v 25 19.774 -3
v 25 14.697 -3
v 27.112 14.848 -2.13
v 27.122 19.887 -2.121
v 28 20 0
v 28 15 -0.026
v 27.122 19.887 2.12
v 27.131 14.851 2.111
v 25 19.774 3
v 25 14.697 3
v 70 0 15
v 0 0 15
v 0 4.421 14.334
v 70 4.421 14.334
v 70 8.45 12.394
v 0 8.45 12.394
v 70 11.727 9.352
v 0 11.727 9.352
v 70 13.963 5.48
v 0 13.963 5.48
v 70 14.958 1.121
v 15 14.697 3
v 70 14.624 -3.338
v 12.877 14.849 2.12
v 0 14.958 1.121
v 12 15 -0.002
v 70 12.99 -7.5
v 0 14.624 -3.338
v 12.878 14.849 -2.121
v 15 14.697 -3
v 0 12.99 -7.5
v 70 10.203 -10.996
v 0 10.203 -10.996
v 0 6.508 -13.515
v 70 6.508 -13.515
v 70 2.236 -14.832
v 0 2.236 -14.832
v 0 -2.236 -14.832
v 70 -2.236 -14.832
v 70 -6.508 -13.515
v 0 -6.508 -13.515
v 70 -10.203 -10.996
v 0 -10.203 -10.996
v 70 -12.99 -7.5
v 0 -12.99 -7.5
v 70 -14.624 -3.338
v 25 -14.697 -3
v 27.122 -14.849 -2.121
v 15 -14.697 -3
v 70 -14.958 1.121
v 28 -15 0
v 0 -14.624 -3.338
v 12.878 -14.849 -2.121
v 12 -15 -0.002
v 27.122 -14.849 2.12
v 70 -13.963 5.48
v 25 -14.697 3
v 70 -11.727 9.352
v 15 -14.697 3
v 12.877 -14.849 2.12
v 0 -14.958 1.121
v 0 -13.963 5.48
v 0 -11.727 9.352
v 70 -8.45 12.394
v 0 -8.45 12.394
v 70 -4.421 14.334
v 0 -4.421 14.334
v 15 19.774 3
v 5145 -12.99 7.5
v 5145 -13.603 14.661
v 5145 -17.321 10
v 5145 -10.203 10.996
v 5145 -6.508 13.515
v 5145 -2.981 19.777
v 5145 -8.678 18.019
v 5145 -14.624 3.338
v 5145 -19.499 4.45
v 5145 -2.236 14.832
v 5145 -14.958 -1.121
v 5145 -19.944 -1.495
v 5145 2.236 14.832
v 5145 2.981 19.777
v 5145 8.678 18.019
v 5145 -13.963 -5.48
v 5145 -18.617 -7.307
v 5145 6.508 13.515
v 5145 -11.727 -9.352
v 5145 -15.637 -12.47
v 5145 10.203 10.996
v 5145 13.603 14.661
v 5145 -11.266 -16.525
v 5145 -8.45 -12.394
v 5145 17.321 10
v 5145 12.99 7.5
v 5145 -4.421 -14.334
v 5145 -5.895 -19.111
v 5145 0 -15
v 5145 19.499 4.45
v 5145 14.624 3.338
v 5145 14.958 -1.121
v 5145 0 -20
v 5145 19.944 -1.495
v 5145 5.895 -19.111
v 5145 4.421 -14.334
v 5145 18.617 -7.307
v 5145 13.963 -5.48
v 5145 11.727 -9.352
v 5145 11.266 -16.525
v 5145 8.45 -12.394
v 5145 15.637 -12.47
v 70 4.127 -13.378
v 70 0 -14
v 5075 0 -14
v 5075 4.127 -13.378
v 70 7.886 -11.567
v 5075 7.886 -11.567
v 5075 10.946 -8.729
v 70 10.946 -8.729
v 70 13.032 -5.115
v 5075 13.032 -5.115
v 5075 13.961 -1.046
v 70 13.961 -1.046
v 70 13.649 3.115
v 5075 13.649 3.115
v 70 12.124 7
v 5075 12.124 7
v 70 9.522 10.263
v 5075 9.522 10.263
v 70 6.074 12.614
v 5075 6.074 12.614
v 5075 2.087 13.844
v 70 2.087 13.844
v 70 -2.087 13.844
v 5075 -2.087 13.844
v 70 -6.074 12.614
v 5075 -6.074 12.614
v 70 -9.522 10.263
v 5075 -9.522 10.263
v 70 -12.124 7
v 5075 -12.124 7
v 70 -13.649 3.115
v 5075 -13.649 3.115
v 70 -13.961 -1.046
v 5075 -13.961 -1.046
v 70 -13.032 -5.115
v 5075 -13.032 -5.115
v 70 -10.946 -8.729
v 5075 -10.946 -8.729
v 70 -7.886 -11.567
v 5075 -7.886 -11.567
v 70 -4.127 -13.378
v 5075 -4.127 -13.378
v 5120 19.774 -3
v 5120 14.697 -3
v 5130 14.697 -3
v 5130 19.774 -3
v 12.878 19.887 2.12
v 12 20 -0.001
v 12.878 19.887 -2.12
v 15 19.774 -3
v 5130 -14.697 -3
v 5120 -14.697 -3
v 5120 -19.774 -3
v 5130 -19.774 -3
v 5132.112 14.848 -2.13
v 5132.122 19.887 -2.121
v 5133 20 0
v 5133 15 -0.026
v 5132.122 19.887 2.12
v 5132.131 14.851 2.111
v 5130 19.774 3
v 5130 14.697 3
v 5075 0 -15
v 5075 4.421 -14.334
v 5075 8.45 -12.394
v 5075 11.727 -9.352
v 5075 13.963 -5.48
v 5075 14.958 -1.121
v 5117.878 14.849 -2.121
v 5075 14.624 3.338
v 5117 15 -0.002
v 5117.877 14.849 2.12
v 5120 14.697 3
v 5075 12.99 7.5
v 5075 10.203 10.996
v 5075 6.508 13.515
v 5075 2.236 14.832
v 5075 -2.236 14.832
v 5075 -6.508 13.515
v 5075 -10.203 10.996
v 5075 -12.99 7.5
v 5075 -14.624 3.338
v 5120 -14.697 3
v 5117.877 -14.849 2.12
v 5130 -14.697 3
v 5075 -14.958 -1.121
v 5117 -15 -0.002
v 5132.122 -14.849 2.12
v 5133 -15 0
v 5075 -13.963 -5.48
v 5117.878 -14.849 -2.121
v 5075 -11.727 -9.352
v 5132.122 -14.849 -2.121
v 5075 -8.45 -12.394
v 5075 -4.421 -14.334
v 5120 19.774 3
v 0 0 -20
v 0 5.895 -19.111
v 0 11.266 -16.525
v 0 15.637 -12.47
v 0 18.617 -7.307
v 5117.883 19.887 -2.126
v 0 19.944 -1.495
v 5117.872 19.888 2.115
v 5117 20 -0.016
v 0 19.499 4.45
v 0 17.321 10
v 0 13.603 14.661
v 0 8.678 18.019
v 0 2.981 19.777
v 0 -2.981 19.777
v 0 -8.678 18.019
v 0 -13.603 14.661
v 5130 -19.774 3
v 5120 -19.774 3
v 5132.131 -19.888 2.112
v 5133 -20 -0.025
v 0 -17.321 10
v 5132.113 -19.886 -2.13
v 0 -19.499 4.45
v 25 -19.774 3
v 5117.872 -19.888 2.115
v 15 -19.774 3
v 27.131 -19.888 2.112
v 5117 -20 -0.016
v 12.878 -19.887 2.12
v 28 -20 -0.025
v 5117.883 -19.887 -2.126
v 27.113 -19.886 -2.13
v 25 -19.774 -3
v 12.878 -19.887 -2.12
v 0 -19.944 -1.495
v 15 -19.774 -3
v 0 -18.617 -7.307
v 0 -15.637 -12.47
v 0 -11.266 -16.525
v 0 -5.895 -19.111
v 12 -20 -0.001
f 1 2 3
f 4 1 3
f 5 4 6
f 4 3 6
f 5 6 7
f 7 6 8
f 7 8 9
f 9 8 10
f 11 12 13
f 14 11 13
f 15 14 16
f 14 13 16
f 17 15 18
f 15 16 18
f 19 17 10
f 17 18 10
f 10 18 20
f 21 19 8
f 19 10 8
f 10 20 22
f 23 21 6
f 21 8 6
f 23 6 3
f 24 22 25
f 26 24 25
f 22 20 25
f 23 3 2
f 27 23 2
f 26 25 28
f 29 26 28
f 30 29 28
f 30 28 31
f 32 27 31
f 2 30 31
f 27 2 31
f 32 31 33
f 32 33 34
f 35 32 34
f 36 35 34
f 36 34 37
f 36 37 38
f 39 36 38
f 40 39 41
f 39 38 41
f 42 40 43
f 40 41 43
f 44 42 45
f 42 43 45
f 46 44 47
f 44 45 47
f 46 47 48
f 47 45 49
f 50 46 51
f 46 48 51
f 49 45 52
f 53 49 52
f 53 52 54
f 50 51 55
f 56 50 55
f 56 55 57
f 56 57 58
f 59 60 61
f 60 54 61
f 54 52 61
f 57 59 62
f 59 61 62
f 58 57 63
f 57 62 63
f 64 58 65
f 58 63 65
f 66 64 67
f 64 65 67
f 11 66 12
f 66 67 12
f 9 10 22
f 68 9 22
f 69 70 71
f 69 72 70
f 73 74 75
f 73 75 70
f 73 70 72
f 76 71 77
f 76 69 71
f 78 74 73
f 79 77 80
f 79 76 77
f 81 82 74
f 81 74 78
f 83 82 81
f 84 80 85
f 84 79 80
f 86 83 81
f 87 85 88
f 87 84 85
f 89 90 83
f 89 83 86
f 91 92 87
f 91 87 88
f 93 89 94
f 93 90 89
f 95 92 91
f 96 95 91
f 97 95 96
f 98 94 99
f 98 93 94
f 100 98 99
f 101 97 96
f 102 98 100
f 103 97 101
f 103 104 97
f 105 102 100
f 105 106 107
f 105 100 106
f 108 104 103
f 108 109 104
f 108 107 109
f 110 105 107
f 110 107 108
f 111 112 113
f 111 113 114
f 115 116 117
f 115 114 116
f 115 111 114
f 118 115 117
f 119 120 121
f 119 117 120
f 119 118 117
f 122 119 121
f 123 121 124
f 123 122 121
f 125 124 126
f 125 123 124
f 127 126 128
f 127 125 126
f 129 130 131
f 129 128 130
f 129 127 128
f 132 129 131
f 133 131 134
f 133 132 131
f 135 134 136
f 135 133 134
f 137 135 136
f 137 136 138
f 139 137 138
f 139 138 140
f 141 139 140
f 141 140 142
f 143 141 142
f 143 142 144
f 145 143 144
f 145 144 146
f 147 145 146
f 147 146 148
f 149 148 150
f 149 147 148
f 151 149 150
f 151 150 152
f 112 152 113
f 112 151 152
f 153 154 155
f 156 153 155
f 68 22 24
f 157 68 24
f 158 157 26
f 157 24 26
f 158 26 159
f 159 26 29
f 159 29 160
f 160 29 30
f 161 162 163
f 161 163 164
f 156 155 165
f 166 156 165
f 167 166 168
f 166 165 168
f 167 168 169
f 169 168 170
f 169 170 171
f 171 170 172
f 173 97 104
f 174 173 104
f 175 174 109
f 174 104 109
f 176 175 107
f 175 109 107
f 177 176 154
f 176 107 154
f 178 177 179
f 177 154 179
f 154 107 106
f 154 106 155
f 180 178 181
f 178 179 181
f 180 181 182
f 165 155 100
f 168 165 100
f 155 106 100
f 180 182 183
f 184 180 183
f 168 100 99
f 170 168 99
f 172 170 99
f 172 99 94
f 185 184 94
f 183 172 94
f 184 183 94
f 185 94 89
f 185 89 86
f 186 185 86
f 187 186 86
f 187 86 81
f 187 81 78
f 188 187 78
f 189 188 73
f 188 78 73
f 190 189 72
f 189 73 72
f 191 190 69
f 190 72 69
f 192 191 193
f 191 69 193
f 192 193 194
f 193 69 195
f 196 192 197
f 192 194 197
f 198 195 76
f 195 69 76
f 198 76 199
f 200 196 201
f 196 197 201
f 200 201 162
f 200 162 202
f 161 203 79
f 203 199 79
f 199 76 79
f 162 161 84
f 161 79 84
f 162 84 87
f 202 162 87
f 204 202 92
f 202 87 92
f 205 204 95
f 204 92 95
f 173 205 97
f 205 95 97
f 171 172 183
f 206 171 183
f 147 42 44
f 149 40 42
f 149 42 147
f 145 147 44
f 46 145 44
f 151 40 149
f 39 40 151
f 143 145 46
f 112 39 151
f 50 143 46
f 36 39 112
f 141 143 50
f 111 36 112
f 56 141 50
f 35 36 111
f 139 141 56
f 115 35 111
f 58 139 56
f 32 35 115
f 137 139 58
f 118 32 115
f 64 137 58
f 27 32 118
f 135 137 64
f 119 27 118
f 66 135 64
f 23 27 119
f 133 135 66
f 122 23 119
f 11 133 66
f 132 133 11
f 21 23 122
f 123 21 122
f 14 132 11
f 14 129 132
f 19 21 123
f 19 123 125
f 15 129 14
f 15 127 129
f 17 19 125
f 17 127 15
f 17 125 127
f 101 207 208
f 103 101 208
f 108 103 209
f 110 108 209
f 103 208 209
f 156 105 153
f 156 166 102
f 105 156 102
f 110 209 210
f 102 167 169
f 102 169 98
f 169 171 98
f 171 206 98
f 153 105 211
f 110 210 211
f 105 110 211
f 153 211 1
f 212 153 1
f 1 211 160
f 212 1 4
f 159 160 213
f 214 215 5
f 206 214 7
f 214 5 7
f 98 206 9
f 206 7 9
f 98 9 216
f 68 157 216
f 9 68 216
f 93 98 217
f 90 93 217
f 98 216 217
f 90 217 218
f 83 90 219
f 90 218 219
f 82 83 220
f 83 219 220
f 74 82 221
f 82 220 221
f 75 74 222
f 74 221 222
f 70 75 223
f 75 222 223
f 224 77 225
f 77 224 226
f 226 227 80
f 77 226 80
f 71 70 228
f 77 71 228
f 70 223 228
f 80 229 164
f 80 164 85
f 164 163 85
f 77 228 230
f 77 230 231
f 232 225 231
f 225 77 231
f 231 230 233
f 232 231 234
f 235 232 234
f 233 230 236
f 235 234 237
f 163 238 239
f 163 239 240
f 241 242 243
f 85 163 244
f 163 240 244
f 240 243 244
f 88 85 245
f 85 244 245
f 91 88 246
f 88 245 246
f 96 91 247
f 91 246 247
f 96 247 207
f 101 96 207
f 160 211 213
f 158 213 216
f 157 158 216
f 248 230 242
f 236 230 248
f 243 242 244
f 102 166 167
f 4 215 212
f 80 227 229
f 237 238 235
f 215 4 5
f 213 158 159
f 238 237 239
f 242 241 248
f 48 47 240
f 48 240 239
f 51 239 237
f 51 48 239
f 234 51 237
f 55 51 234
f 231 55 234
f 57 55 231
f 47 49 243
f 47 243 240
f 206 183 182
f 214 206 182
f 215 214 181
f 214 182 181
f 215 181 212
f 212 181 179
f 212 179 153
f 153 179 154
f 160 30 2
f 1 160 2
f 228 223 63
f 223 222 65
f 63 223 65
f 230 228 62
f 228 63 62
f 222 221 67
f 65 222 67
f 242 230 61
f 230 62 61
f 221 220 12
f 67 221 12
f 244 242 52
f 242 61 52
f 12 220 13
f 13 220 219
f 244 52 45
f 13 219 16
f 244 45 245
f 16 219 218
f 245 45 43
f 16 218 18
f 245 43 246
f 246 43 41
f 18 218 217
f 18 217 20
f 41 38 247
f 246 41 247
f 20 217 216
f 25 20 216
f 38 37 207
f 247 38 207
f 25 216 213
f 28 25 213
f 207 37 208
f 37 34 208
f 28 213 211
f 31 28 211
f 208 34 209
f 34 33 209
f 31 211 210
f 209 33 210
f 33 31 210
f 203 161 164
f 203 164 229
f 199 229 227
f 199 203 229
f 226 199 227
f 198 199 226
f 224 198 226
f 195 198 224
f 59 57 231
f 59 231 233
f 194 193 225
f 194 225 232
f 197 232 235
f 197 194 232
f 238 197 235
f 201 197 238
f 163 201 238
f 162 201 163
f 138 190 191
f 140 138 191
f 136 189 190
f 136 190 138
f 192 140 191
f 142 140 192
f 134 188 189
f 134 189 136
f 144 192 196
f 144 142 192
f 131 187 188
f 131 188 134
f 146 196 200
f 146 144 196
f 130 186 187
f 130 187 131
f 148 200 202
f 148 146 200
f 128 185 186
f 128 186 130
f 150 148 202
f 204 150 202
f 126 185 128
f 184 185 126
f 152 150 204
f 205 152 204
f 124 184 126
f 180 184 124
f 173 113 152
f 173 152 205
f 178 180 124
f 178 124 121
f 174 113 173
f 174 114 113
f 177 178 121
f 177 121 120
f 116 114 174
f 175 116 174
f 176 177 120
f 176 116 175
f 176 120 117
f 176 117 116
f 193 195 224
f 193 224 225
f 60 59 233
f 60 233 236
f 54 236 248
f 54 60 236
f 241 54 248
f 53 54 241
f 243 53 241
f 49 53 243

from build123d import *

# Parameters (mm, degrees)
SKETCH_1_R               = 20
SKETCH_1_R_2             = 14
EXTRUDE_1_DEPTH          = 5145
SKETCH_2_R               = 15
CUT_EXTRUDE_1_DEPTH      = 70
SKETCH_3_R               = 15
CUT_EXTRUDE_2_DEPTH      = 70
CUT_EXTRUDE_3_DEPTH      = 21
CUT_EXTRUDE_3_DEPTH_BACK = 21


with BuildPart() as part:
    # 草图1 → 凸台-拉伸1 (new body)
    with BuildSketch(Plane(origin=(0, 0, 0), x_dir=(0, 0, -1), z_dir=(1, 0, 0))):
        Circle(SKETCH_1_R)
        Circle(SKETCH_1_R_2, mode=Mode.SUBTRACT)
    extrude(amount=EXTRUDE_1_DEPTH)

    # 草图2 → 切除-拉伸1 (cut)
    with BuildSketch(Plane.ZY):
        Circle(SKETCH_2_R)
    extrude(amount=-CUT_EXTRUDE_1_DEPTH, mode=Mode.SUBTRACT)

    # 草图3 → 切除-拉伸2 (cut)
    with BuildSketch(Plane(origin=(5145, 0, 0), x_dir=(0, 0, -1), z_dir=(1, 0, 0))):
        Circle(SKETCH_3_R)
    extrude(amount=-CUT_EXTRUDE_2_DEPTH, mode=Mode.SUBTRACT)

    # 草图4 → 切除-拉伸3 (cut, two sides)
    with BuildSketch(Plane(origin=(0, 0, 0), x_dir=(1, 0, 0), z_dir=(0, 1, 0))) as cut_extrude_3_sk:
        with BuildLine():
            Line((5120, 3), (5130, 3))
            ThreePointArc((5130, 3), (5133, 0), (5130, -3))
            Line((5130, -3), (5120, -3))
            ThreePointArc((5120, -3), (5117, 0), (5120, 3))
        make_face()
        with BuildLine():
            Line((15, 3), (25, 3))
            ThreePointArc((25, 3), (28, 0), (25, -3))
            Line((25, -3), (15, -3))
            ThreePointArc((15, -3), (12, 0), (15, 3))
        make_face()
    extrude(amount=CUT_EXTRUDE_3_DEPTH, mode=Mode.SUBTRACT)
    extrude(cut_extrude_3_sk.sketch, amount=-CUT_EXTRUDE_3_DEPTH_BACK, mode=Mode.SUBTRACT)


solid = part.part
